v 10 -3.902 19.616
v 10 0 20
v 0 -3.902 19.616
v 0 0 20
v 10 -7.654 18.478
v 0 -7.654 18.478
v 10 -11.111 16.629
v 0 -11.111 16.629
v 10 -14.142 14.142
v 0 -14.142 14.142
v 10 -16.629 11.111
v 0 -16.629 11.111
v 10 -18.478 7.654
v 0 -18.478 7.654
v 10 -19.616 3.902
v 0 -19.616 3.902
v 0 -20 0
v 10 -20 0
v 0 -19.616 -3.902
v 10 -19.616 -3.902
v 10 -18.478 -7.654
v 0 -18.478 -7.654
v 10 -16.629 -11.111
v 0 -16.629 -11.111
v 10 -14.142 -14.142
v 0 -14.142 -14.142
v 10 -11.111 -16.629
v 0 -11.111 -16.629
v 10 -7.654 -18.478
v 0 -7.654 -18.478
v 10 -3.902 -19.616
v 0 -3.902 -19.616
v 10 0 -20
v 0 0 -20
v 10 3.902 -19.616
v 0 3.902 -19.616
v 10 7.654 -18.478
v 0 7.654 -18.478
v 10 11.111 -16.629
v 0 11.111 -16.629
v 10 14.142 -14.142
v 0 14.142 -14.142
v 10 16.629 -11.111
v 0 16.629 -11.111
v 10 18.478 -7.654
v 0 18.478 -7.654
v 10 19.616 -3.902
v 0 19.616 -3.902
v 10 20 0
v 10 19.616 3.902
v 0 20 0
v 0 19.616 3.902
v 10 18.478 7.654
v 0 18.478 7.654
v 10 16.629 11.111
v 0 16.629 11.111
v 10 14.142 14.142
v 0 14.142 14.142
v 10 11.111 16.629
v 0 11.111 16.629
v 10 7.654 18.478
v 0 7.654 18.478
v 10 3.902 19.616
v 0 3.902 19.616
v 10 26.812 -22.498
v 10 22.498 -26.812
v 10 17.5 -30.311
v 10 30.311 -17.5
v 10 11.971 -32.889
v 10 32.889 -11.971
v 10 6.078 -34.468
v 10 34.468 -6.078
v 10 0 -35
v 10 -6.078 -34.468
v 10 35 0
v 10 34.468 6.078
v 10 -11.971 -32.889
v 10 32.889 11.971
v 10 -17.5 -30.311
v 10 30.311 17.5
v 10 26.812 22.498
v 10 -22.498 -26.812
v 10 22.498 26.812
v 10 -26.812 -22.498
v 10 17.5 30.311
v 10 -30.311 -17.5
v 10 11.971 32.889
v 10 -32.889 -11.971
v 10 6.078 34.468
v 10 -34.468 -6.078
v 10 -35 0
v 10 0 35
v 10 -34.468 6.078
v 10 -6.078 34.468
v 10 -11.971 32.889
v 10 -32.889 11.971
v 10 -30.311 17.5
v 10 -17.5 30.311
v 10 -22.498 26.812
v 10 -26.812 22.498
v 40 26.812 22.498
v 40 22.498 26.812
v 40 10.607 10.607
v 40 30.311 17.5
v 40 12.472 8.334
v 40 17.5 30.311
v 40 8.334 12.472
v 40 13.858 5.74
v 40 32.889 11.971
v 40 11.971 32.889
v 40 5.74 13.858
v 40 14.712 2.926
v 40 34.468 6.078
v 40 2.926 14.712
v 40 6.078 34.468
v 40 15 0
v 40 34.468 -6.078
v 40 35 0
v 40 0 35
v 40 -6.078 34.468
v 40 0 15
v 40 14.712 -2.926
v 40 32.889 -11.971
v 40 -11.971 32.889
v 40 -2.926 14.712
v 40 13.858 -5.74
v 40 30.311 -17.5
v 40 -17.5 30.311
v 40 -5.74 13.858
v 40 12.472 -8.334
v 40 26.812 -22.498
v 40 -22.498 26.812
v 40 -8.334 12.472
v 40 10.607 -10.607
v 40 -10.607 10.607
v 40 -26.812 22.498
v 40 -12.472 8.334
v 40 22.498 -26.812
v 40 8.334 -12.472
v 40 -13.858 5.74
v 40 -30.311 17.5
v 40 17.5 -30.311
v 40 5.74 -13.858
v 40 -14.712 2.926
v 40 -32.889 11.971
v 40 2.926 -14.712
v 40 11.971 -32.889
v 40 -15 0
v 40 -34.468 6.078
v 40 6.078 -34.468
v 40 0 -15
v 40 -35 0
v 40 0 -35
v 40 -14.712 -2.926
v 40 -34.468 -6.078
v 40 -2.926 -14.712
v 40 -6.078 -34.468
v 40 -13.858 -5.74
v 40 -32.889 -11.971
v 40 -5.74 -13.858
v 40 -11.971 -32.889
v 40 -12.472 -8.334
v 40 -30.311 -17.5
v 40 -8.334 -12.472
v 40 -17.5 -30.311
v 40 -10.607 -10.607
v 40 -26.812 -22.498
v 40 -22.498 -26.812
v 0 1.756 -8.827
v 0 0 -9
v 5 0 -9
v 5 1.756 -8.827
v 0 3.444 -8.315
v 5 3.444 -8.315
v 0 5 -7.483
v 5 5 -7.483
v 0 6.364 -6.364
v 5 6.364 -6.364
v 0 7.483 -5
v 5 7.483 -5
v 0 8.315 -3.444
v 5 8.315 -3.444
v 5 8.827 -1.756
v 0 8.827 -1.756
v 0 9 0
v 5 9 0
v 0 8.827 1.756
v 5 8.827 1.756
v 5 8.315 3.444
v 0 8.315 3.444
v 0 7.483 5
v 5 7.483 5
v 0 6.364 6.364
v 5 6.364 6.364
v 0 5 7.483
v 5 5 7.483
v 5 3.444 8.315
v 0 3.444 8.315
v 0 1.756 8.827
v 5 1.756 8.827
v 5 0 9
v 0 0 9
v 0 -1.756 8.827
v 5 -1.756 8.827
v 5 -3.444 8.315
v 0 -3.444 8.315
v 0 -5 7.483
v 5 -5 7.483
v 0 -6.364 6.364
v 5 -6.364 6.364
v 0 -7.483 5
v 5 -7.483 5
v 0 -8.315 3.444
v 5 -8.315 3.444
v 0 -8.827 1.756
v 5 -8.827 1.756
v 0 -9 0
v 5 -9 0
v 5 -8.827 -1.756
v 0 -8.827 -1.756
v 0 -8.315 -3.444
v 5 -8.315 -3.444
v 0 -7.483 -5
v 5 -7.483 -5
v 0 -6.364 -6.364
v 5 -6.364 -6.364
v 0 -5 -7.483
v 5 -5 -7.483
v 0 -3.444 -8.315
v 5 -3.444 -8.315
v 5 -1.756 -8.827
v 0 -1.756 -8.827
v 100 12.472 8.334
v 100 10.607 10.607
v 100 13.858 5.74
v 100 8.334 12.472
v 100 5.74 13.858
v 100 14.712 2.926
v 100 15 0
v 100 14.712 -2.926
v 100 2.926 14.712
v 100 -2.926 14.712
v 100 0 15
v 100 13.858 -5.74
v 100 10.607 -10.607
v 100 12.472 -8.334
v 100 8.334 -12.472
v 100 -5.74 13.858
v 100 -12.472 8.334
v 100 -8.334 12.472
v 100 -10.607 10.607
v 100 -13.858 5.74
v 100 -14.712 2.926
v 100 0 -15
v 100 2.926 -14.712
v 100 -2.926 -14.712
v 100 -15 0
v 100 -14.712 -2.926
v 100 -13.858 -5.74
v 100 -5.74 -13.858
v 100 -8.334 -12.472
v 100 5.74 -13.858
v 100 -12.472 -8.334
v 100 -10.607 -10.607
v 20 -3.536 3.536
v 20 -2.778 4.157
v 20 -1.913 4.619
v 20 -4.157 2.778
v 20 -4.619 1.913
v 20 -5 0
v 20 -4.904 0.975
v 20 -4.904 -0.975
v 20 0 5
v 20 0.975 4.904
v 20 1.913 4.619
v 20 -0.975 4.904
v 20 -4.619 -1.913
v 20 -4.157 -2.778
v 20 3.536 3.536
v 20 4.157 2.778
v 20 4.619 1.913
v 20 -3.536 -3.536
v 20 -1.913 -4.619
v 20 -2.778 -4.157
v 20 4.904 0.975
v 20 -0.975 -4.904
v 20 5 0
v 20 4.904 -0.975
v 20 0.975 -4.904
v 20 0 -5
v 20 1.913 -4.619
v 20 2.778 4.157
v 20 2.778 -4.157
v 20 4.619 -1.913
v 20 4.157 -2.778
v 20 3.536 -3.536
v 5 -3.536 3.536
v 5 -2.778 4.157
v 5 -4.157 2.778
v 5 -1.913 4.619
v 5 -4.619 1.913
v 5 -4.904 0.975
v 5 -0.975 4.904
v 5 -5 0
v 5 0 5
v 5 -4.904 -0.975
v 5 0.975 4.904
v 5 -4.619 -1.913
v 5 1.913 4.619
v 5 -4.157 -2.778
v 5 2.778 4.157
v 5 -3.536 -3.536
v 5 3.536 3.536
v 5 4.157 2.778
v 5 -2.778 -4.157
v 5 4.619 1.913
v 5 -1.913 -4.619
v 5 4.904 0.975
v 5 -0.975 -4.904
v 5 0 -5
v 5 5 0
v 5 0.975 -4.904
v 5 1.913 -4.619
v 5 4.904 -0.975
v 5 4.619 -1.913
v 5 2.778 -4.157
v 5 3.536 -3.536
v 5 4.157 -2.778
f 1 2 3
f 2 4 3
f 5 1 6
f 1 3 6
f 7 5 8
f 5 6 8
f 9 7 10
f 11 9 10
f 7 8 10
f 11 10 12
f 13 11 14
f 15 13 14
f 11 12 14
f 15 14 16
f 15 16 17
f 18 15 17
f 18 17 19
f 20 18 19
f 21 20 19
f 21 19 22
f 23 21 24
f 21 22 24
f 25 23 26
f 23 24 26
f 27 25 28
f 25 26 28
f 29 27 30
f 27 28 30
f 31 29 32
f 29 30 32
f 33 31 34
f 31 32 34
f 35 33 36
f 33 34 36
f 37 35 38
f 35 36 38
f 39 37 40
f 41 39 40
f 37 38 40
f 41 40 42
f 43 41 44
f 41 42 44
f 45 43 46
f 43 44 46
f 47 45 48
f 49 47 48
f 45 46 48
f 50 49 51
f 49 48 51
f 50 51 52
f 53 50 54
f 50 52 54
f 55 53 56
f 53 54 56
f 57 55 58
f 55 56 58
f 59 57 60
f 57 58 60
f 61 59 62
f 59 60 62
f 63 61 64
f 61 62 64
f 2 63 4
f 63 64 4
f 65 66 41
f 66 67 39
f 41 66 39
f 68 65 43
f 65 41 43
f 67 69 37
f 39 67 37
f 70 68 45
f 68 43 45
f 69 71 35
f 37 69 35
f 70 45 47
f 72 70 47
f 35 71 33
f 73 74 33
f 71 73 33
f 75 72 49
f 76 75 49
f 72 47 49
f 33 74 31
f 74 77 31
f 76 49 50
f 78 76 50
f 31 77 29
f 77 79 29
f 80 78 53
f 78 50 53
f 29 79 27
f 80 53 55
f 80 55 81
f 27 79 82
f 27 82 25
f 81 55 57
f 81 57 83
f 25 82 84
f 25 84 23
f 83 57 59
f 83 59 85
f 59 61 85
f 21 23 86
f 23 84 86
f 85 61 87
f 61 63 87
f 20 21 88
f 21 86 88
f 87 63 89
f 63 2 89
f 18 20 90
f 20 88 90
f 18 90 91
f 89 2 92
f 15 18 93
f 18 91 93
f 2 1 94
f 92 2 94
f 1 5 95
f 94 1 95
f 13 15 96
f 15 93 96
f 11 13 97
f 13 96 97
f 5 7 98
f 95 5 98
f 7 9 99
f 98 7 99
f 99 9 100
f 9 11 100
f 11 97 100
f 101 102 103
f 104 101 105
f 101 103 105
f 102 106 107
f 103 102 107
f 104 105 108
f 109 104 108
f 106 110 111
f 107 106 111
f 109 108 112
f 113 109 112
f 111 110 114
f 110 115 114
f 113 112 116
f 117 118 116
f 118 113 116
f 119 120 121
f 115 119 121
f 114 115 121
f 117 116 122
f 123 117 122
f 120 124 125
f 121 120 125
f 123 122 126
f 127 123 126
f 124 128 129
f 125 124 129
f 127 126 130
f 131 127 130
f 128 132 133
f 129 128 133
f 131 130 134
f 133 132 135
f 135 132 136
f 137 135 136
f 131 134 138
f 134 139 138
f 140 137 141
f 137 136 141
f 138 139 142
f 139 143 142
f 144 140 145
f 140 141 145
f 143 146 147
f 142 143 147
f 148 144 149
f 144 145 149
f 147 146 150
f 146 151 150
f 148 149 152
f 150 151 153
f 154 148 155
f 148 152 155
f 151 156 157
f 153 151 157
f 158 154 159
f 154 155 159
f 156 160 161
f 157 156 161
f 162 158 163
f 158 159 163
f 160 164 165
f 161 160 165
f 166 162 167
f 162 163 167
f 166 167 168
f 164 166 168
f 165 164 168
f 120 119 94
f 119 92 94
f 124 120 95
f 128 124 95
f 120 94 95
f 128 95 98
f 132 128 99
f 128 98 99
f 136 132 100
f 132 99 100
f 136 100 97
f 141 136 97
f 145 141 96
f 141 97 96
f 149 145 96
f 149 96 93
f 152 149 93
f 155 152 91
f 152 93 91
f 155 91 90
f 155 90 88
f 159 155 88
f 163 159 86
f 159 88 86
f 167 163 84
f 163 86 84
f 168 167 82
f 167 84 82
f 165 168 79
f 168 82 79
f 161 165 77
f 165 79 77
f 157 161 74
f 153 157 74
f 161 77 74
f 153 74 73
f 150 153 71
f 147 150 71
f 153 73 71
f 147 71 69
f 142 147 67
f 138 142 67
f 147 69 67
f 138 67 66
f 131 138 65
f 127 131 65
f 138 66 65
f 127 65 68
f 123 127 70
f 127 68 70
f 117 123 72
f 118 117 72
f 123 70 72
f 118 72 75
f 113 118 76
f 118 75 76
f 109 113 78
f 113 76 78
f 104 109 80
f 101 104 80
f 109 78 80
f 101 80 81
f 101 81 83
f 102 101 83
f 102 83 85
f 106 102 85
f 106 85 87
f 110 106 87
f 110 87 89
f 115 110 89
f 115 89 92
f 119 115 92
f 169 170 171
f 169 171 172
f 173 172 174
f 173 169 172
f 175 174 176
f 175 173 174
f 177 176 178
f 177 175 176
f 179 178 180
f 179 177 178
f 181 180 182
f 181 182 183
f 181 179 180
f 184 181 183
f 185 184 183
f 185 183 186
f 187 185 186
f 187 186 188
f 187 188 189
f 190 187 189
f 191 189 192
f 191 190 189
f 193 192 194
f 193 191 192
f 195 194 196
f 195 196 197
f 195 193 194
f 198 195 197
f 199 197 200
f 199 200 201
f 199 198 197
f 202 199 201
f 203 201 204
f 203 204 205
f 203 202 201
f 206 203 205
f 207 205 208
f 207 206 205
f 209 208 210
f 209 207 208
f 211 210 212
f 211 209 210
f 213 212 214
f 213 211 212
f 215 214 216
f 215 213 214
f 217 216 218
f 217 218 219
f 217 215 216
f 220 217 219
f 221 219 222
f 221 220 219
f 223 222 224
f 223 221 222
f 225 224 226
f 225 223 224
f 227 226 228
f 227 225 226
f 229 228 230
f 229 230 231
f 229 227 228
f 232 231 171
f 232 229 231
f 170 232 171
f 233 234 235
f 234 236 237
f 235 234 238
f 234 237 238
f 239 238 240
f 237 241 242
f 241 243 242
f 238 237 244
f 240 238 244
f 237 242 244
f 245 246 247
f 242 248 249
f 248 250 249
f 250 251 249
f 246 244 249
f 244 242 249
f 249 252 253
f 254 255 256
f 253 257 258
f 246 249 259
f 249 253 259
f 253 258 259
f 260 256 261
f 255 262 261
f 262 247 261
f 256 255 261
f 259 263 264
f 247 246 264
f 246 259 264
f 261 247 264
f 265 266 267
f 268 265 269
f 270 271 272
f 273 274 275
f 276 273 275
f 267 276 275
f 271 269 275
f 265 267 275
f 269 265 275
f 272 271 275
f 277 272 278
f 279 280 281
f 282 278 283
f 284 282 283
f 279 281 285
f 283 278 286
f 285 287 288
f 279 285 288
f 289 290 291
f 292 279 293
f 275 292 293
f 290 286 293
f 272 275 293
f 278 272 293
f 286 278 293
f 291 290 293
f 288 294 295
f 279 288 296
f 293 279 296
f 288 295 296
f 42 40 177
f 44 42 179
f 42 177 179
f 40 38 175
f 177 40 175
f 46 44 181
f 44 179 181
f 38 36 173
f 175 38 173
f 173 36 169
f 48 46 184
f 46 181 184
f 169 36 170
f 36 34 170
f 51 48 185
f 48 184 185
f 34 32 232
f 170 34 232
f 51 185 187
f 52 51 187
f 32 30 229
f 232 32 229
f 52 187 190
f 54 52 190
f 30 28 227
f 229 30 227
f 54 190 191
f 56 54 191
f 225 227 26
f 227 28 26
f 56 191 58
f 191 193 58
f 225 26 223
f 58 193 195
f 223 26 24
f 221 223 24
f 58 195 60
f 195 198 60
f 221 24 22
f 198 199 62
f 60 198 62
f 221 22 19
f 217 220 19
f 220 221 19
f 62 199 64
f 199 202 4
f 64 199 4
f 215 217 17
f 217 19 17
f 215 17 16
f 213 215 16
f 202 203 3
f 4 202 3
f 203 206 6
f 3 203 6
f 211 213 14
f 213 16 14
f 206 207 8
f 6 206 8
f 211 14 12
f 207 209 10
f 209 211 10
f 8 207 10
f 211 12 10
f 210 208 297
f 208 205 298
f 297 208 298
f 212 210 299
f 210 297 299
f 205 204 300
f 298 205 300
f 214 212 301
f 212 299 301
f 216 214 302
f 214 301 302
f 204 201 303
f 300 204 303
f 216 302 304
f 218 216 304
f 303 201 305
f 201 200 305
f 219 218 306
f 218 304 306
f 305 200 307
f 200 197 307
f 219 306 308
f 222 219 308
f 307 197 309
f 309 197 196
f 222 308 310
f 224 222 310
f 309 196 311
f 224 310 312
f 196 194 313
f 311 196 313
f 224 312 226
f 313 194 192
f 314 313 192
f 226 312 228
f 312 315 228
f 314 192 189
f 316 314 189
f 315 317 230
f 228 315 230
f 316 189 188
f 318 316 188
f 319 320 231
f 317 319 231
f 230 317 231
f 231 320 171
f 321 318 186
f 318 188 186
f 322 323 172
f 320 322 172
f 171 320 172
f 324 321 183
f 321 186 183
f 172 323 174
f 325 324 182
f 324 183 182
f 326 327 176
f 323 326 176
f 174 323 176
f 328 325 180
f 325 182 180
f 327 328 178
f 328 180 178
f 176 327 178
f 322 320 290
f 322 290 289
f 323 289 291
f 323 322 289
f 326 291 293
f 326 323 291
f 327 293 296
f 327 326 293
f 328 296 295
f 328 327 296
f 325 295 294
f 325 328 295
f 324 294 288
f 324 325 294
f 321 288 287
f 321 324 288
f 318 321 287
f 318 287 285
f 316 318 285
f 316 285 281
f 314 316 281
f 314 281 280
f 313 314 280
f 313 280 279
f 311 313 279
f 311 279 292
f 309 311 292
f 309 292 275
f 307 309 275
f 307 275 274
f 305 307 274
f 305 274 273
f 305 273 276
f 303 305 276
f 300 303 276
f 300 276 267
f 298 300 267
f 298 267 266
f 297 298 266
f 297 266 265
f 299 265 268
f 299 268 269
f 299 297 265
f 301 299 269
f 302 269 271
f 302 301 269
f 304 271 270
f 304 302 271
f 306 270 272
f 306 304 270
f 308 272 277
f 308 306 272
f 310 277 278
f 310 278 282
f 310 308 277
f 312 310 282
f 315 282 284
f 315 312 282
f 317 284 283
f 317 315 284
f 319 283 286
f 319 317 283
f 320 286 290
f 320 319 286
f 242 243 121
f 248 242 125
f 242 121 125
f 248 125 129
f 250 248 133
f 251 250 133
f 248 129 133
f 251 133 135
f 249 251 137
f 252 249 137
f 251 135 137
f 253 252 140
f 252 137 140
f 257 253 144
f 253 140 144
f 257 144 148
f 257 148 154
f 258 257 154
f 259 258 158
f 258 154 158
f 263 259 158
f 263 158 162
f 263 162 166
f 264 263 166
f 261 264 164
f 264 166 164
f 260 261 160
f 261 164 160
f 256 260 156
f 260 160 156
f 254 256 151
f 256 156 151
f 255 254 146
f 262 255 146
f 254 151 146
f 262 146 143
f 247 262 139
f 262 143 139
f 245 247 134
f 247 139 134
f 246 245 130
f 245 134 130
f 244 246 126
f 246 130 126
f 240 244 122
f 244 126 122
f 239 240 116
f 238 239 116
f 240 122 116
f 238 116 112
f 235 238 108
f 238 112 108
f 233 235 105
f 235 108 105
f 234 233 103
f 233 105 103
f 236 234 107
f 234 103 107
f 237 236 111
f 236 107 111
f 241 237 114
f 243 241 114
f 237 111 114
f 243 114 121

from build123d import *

# Parameters (mm, degrees)
SKETCH_2_R          = 5
CUT_EXTRUDE_1_DEPTH = 20
SKETCH_3_R          = 9
CUT_EXTRUDE_2_DEPTH = 5


with BuildPart() as part:
    # Эскиз1 → Повернуть1 (revolve)
    with BuildSketch(Plane.XY, mode=Mode.PRIVATE) as revolve_1_sk:
        Polygon((0, 0), (100, 0), (100, 15), (40, 15), (40, 35), (10, 35), (10, 20), (0, 20), align=None)
    revolve(revolve_1_sk.sketch.rotate(Axis((0, 0, 0), (1, 0, 0)), 90), axis=Axis((0, 0, 0), (1, 0, 0)))

    # Эскиз2 → Вырез-Вытянуть1 (cut)
    with BuildSketch(Plane(origin=(0, 0, 0), x_dir=(0, 0, -1), z_dir=(1, 0, 0))):
        Circle(SKETCH_2_R)
    extrude(amount=CUT_EXTRUDE_1_DEPTH, mode=Mode.SUBTRACT)

    # Эскиз3 → Вырез-Вытянуть2 (cut)
    with BuildSketch(Plane(origin=(0, 0, 0), x_dir=(0, 0, -1), z_dir=(1, 0, 0))):
        Circle(SKETCH_3_R)
    extrude(amount=CUT_EXTRUDE_2_DEPTH, mode=Mode.SUBTRACT)


solid = part.part
